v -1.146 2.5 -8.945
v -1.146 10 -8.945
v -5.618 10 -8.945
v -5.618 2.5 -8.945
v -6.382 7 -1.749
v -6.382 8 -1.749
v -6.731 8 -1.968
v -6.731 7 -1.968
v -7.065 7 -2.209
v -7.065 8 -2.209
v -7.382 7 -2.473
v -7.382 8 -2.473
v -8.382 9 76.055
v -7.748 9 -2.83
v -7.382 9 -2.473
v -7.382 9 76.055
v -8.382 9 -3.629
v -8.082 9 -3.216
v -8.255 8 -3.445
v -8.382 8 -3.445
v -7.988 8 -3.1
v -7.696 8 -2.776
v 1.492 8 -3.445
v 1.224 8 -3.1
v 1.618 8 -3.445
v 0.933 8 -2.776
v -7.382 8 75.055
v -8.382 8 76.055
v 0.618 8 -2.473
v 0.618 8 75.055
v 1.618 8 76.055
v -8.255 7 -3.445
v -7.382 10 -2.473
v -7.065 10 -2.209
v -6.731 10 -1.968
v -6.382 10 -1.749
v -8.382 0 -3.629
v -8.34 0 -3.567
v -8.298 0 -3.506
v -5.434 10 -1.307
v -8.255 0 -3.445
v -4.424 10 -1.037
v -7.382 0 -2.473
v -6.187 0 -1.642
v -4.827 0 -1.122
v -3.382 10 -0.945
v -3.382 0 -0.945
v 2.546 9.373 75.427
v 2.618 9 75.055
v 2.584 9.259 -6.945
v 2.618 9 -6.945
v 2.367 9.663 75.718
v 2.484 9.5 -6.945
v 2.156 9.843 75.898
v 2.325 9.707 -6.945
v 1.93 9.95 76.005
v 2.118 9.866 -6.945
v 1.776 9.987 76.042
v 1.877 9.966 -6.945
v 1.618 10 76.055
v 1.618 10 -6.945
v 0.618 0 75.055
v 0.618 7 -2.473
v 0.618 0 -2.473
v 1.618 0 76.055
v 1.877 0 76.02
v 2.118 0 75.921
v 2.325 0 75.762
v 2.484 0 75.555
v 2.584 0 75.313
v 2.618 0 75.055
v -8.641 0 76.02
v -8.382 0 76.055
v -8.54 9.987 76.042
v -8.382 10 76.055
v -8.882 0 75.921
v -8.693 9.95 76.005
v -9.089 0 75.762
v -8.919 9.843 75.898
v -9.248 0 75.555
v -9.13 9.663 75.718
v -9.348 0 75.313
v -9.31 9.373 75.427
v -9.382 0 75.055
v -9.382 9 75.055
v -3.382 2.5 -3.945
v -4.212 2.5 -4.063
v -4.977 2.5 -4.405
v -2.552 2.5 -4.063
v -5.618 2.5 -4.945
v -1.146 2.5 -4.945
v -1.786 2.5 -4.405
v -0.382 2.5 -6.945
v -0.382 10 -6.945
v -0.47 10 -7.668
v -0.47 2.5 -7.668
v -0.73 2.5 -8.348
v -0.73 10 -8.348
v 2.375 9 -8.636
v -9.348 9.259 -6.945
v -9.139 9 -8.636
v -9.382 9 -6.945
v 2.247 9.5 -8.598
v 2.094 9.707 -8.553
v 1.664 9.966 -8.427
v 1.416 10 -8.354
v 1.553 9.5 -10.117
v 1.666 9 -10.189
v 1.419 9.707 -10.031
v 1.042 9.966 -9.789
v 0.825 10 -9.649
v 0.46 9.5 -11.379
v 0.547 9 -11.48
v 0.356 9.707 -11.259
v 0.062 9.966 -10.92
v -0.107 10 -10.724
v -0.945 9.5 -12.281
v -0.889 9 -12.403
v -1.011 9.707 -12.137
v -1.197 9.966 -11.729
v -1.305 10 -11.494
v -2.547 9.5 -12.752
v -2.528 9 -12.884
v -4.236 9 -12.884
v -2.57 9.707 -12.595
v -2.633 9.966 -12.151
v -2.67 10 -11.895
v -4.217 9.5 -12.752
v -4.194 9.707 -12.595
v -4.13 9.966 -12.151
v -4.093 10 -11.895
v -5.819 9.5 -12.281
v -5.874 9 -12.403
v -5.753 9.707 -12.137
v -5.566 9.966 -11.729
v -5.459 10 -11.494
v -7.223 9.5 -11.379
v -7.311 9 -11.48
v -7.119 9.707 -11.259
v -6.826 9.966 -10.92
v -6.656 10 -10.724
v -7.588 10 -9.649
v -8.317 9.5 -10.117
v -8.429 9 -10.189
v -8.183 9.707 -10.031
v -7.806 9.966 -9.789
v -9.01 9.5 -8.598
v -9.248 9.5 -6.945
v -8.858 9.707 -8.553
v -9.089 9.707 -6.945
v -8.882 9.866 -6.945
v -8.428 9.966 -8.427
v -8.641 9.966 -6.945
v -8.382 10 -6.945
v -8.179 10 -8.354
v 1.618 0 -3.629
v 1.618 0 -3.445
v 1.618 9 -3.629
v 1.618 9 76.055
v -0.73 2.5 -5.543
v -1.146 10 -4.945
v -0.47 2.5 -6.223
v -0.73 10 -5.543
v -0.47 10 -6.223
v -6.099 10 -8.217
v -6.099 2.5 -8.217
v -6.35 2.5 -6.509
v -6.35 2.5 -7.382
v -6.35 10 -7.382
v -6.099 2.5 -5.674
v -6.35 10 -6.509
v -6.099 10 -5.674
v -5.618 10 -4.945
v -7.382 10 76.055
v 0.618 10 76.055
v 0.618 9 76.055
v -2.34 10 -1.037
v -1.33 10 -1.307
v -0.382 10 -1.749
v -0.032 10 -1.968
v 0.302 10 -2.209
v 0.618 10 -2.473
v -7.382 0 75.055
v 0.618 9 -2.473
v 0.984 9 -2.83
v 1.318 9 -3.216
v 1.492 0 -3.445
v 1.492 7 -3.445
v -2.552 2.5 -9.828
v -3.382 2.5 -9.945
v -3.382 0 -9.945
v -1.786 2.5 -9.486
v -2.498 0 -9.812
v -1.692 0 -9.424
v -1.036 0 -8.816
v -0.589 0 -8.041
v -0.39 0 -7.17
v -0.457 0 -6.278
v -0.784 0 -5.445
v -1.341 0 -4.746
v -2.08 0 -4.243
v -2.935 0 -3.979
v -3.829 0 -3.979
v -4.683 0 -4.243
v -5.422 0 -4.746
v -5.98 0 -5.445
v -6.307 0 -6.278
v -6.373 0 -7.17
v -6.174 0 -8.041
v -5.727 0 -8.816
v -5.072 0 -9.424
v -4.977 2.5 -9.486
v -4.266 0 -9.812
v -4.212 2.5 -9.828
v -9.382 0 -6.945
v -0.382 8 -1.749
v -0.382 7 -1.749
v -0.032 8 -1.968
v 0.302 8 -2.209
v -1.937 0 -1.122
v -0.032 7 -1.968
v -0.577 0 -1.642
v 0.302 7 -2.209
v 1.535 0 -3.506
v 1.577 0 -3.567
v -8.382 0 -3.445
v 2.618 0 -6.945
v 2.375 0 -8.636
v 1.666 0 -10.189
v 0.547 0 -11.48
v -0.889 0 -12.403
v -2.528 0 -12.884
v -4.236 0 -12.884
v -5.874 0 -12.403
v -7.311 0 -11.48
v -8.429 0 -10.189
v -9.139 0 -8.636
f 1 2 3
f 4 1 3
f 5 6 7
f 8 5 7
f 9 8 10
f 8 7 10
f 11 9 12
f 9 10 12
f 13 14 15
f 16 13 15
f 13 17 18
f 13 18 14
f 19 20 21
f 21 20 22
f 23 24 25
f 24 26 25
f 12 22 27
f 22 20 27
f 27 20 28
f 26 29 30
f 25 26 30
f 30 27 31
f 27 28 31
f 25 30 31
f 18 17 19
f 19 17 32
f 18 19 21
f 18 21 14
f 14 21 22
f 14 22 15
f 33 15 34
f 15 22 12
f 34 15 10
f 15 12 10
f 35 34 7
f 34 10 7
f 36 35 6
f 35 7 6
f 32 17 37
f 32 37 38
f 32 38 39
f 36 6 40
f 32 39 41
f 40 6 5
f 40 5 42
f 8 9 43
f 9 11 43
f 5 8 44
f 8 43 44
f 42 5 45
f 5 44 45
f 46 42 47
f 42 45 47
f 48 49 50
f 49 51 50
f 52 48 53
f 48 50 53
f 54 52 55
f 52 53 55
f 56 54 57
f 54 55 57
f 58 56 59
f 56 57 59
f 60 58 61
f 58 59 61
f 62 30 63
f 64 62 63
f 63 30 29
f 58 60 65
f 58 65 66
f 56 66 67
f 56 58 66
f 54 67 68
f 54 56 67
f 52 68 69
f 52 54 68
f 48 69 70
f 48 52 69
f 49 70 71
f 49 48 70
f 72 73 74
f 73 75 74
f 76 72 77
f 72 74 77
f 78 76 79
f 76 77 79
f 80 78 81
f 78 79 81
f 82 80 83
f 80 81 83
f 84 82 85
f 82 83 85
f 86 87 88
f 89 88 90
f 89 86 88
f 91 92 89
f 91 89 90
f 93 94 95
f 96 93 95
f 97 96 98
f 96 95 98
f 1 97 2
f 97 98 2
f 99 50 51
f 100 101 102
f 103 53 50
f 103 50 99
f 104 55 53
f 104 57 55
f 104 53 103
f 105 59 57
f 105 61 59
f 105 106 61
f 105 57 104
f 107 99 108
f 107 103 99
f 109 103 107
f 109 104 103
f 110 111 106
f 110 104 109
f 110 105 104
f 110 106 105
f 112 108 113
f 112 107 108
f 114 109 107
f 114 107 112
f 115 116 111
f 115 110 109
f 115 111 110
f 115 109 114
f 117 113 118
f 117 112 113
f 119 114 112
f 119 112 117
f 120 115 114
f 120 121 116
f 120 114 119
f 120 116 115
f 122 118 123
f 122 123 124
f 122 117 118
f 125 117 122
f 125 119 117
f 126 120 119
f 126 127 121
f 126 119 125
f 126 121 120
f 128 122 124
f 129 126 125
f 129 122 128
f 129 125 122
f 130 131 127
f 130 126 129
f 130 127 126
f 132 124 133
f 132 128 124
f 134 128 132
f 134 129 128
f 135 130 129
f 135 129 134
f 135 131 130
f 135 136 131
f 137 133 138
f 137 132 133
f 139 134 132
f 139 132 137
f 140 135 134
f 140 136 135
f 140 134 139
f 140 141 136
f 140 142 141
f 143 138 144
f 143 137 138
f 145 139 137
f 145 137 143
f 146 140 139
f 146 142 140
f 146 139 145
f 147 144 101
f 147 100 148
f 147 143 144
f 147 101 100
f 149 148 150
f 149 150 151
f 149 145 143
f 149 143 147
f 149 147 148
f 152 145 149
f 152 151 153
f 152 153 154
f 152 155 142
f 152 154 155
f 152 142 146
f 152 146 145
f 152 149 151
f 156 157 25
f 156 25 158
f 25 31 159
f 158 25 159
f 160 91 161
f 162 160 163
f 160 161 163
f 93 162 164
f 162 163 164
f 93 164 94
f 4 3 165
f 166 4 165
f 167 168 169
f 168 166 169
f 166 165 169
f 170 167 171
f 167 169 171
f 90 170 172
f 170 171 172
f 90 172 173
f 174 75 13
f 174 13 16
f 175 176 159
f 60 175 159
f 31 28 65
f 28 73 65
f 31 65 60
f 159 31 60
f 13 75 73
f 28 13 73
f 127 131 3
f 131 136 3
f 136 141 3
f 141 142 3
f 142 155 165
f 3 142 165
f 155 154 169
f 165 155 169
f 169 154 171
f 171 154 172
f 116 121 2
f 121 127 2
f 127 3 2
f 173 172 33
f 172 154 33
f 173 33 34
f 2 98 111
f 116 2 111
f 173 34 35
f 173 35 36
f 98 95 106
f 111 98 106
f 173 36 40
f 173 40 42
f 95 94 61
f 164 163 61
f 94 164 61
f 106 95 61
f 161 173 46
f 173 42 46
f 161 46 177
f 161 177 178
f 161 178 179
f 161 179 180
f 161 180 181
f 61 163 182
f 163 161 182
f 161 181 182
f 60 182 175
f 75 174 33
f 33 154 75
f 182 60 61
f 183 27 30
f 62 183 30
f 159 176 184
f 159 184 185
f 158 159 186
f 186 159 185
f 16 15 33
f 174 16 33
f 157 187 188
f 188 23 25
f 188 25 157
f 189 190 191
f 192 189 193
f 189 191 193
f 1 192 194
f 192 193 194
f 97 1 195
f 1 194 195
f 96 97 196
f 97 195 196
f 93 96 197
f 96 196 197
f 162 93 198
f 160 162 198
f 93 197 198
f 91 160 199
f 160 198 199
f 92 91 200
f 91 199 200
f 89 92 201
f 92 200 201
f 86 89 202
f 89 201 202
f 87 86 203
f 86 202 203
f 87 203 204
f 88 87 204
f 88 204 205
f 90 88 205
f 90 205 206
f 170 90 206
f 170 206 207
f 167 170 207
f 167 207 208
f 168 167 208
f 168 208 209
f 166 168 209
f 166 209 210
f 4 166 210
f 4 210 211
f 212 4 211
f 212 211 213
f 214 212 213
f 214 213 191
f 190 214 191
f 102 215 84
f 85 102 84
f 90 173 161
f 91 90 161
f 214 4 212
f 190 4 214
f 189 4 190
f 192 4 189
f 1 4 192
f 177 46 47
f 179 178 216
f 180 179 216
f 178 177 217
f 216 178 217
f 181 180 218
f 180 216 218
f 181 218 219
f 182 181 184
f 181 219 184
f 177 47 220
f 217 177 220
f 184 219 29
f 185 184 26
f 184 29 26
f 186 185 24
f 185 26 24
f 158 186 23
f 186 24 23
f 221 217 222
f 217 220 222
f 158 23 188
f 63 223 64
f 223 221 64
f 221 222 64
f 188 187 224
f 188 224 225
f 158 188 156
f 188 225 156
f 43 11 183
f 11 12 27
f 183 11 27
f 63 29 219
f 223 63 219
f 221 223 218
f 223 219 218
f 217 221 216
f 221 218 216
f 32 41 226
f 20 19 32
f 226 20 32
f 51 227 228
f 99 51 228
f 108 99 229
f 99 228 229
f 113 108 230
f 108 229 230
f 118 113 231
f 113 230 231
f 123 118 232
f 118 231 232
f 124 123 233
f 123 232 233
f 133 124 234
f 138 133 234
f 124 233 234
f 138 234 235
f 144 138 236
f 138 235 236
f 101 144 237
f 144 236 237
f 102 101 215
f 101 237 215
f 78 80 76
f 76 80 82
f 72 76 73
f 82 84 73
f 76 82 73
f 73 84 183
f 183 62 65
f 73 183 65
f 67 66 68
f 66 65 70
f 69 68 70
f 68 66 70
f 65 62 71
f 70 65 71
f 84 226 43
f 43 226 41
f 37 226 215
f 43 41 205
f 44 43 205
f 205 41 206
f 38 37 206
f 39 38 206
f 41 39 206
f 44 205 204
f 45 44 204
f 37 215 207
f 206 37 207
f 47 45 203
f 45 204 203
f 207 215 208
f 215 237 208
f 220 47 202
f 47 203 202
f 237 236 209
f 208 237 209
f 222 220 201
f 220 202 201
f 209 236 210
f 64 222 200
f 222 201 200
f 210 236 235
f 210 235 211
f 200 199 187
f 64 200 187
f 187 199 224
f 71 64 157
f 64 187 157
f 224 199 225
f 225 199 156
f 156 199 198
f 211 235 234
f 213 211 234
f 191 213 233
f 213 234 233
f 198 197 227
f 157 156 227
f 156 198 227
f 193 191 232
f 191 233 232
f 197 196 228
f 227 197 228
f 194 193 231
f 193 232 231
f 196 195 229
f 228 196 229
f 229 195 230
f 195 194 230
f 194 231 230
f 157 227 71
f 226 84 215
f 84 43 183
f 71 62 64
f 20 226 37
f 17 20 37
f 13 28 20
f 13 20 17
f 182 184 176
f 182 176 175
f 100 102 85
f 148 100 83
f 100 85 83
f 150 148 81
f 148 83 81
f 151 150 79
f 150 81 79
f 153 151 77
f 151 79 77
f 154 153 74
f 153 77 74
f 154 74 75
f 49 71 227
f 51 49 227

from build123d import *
from build123d.topology import SkipClean

# Parameters (mm, degrees)
SKETCH1_W           = 1
SKETCH1_H           = 1
SKETCH1_W_2         = 5
BOSS_EXTRUDE2_DEPTH = 10
CUT_EXTRUDE1_DEPTH  = 7.5
CUT_EXTRUDE2_START  = -2.5
CUT_EXTRUDE2_DEPTH  = 2.5
CUT_EXTRUDE3_REACH  = 92.05
SKETCH5_W           = 5
SKETCH5_H           = 1
SKETCH6_W           = 2
SKETCH6_H           = 1
BOSS_EXTRUDE3_DEPTH = 79.5
FILLET1_R           = 1
SKETCH7_W           = 1
SKETCH7_H           = 1
CUT_EXTRUDE7_DEPTH  = 79
BOSS_EXTRUDE4_DEPTH = 3
SKETCH9_W           = 1
SKETCH9_H           = 1
CUT_EXTRUDE8_DEPTH  = 6
SKETCH11_W          = 1
SKETCH11_H          = 1
BOSS_EXTRUDE5_DEPTH = 80
SKETCH12_W          = 1
SKETCH12_H          = 1
BOSS_EXTRUDE6_DEPTH = 80
BOSS_EXTRUDE7_DEPTH = 8
CUT_EXTRUDE9_DEPTH  = 1
SKETCH15_R          = 3
CUT_EXTRUDE10_DEPTH = 2.5
CUT_EXTRUDE13_REACH = 79.281


with BuildPart() as part:
    # Sketch1 → Boss-Extrude2 (new body)
    with BuildSketch(Plane(origin=(0, 0, 0), x_dir=(1, 0, 0), z_dir=(0, 1, 0))):
        with BuildLine():
            Line((-5.881818182, 6.945454545), (-3.381818182, 6.945454545))
            Line((-3.381818182, 6.945454545), (-0.881818182, 6.945454545))
            ThreePointArc((-0.881818182, 6.945454545), (-3.381818182, 9.445454545), (-5.881818182, 6.945454545))
        make_face()
        with BuildLine():
            Line((-0.881818182, 6.945454545), (-3.381818182, 6.945454545))
            Line((-3.381818182, 6.945454545), (-3.381818182, 4.445454545))
            ThreePointArc((-3.381818182, 4.445454545), (-1.614051229, 5.177687592), (-0.881818182, 6.945454545))
        make_face()
        with BuildLine():
            Line((-3.381818182, 4.445454545), (-3.381818182, 6.945454545))
            Line((-3.381818182, 6.945454545), (-5.881818182, 6.945454545))
            ThreePointArc((-5.881818182, 6.945454545), (-5.149585135, 5.177687592), (-3.381818182, 4.445454545))
        make_face()
        with BuildLine():
            ThreePointArc((-0.881818182, 6.945454545), (-1.614051229, 5.177687592), (-3.381818182, 4.445454545))
            Line((-3.381818182, 4.445454545), (-3.381818182, 0.945454545))
            ThreePointArc((-3.381818182, 0.945454545), (-0.544543851, 1.658690472), (1.618181818, 3.628829755))
            ThreePointArc((1.618181818, 3.628829755), (2.362744465, 5.213403738), (2.618181818, 6.945454545))
            Line((2.618181818, 6.945454545), (-0.881818182, 6.945454545))
        make_face()
        with BuildLine():
            Line((-3.381818182, 0.945454545), (-3.381818182, 4.445454545))
            ThreePointArc((-3.381818182, 4.445454545), (-5.149585135, 5.177687592), (-5.881818182, 6.945454545))
            Line((-5.881818182, 6.945454545), (-9.381818182, 6.945454545))
            ThreePointArc((-9.381818182, 6.945454545), (-9.126380828, 5.213403738), (-8.381818182, 3.628829755))
            ThreePointArc((-8.381818182, 3.628829755), (-6.219092513, 1.658690472), (-3.381818182, 0.945454545))
        make_face()
        with BuildLine():
            ThreePointArc((-5.881818182, 6.945454545), (-3.381818182, 9.445454545), (-0.881818182, 6.945454545))
            Line((-0.881818182, 6.945454545), (2.618181818, 6.945454545))
            ThreePointArc((2.618181818, 6.945454545), (-3.381818182, 12.945454545), (-9.381818182, 6.945454545))
            Line((-9.381818182, 6.945454545), (-5.881818182, 6.945454545))
        make_face()
        with BuildLine():
            Line((2.618181818, -75.054545455), (2.618181818, 6.945454545))
            ThreePointArc((2.618181818, 6.945454545), (2.362744465, 5.213403738), (1.618181818, 3.628829755))
            Line((1.618181818, 3.628829755), (1.618181818, -75.054545455))
            Line((1.618181818, -75.054545455), (2.618181818, -75.054545455))
        make_face()
        with BuildLine():
            ThreePointArc((-8.381818182, 3.628829755), (-9.126380828, 5.213403738), (-9.381818182, 6.945454545))
            Line((-9.381818182, 6.945454545), (-9.381818182, -75.054545455))
            Line((-9.381818182, -75.054545455), (-8.381818182, -75.054545455))
            Line((-8.381818182, -75.054545455), (-8.381818182, 3.628829755))
        make_face()
        with Locations((-8.881818182, -75.554545455)):
            Rectangle(SKETCH1_W, SKETCH1_H)
        with Locations((-5.881818182, -75.554545455)):
            Rectangle(SKETCH1_W_2, SKETCH1_H)
        with Locations((-0.881818182, -75.554545455)):
            Rectangle(SKETCH1_W_2, SKETCH1_H)
        with Locations((2.118181818, -75.554545455)):
            Rectangle(SKETCH1_W, SKETCH1_H)
    extrude(amount=BOSS_EXTRUDE2_DEPTH)

    # Sketch3 → Cut-Extrude1 (cut)
    with BuildSketch(Plane(origin=(0, 10, 0), x_dir=(1, 0, 0), z_dir=(0, 1, 0))):
        with BuildLine():
            Line((-1.381818182, 8.445454545), (-5.381818182, 8.445454545))
            ThreePointArc((-5.381818182, 8.445454545), (-5.753526425, 7.736023967), (-5.881818182, 6.945454559))
            ThreePointArc((-5.881818182, 6.945454559), (-5.753526429, 6.154885137), (-5.381818182, 5.445454545))
            Line((-5.381818182, 5.445454545), (-1.381818182, 5.445454545))
            ThreePointArc((-1.381818182, 5.445454545), (-1.010109937, 6.15488513), (-0.881818182, 6.945454545))
            ThreePointArc((-0.881818182, 6.945454545), (-1.010109937, 7.73602396), (-1.381818182, 8.445454545))
        make_face()
    extrude(amount=-CUT_EXTRUDE1_DEPTH, mode=Mode.SUBTRACT)

    # Sketch4 → Cut-Extrude2 (cut)
    with SkipClean():  # the faces are left unmerged after this step: merging them gives an invalid solid
        with BuildSketch(Plane.XZ.offset(CUT_EXTRUDE2_START)):
            with BuildLine():
                ThreePointArc((-0.881818182, -6.945454545), (-1.614051229, -5.177687592), (-3.381818182, -4.445454545))
                Line((-3.381818182, -4.445454545), (-3.381818182, -9.445454545))
                ThreePointArc((-3.381818182, -9.445454545), (-1.614051229, -8.713221498), (-0.881818182, -6.945454545))
            make_face()
            with BuildLine():
                Line((-3.381818182, -9.445454545), (-3.381818182, -4.445454545))
                ThreePointArc((-3.381818182, -4.445454545), (-5.881818182, -6.945454545), (-3.381818182, -9.445454545))
            make_face()
        extrude(amount=CUT_EXTRUDE2_DEPTH, mode=Mode.SUBTRACT)

    # Sketch5 → Cut-Extrude3 (cut, up to next)
    with BuildSketch(Plane.XY.offset(76.054545455), mode=Mode.PRIVATE) as cut_extrude3_sk1:
        with Locations((-5.881818182, 8.5)):
            Rectangle(SKETCH5_W, SKETCH5_H)
    cut_extrude3_tool1 = extrude(cut_extrude3_sk1.sketch, amount=-CUT_EXTRUDE3_REACH, mode=Mode.PRIVATE) & part.part
    # Sketch5 → Cut-Extrude3 (cut, up to next)
    with BuildSketch(Plane.XY.offset(76.054545455), mode=Mode.PRIVATE) as cut_extrude3_sk2:
        with Locations((-0.881818182, 8.5)):
            Rectangle(SKETCH5_W, SKETCH5_H)
    cut_extrude3_tool2 = extrude(cut_extrude3_sk2.sketch, amount=-CUT_EXTRUDE3_REACH, mode=Mode.PRIVATE) & part.part
    add(cut_extrude3_tool1.solids().sort_by_distance((-5.881818, 8.5, 76.054545))[0], mode=Mode.SUBTRACT)
    add(cut_extrude3_tool2.solids().sort_by_distance((-0.881818, 8.5, 76.054545))[0], mode=Mode.SUBTRACT)

    # Sketch6 → Boss-Extrude3 (add)
    with SkipClean():  # the faces are left unmerged after this step: merging them gives an invalid solid
        with BuildSketch(Plane.XY.offset(76.054545455)):
            with Locations((-7.381818182, 9.5)):
                Rectangle(SKETCH6_W, SKETCH6_H)
            with Locations((-7.381818182, 7.5)):
                Rectangle(SKETCH6_W, SKETCH6_H)
            with Locations((0.618181818, 7.5)):
                Rectangle(SKETCH6_W, SKETCH6_H)
            with Locations((0.618181818, 9.5)):
                Rectangle(SKETCH6_W, SKETCH6_H)
        extrude(amount=-BOSS_EXTRUDE3_DEPTH)

    # Fillet1
    fillet1_edges = [part.edges().sort_by_distance(p)[0] for p in [
        (2.618181818, 10, 34.554545455),
        (-9.381818182, 5, 76.054545455),
        (2.618181818, 5, 76.054545455),
        (-3.381818182, 10, -12.945454545),
        (-9.381818182, 10, 34.554545455),
    ]]
    fillet(fillet1_edges, radius=FILLET1_R - 0.0001)  # a hair under: the kernel refuses the full size

    # Sketch7 → Cut-Extrude7 (cut)
    with BuildSketch(Plane.XY.offset(76.054545455)):
        with Locations((-6.881818182, 9.5)):
            Rectangle(SKETCH7_W, SKETCH7_H)
        with Locations((0.118181818, 9.5)):
            Rectangle(SKETCH7_W, SKETCH7_H)
    extrude(amount=-CUT_EXTRUDE7_DEPTH, mode=Mode.SUBTRACT)


with BuildPart() as cut_extrude7_piece_1:
    # of the separate pieces the step leaves, piece 1, a body of its own (cut_extrude7_pieces)
    add(part.part.solids().sort_by_distance((1.618281818, 0, 76.054545455))[0])

    # Sketch8 → Boss-Extrude4 (add)
    # profile 1 of 5: a face of its own
    with BuildSketch(Plane(origin=(0, 10, 0), x_dir=(1, 0, 0), z_dir=(0, 1, 0))):
        with BuildLine():
            Line((-8.381818182, 6.945454545), (-8.381818182, 3.628829755))
            ThreePointArc((-8.381818182, 3.628829755), (-8.319368136, 3.536554363), (-8.255215354, 3.445454545))
            ThreePointArc((-8.255215354, 3.445454545), (-7.845063237, 2.935536395), (-7.381818182, 2.47331859))
            Line((-7.381818182, 2.47331859), (-7.381818182, 2.945454545))
            Line((-7.381818182, 2.945454545), (-6.381818182, 2.945454545))
            Line((-6.381818182, 2.945454545), (-6.381818182, 1.749302123))
            ThreePointArc((-6.381818182, 1.749302123), (-3.381818182, 0.945454545), (-0.381818182, 1.749302123))
            Line((-0.381818182, 1.749302123), (-0.381818182, 2.945454545))
            Line((-0.381818182, 2.945454545), (0.618181818, 2.945454545))
            Line((0.618181818, 2.945454545), (0.618181818, 2.47331859))
            ThreePointArc((0.618181818, 2.47331859), (1.081426873, 2.935536395), (1.491578991, 3.445454545))
            ThreePointArc((1.491578991, 3.445454545), (1.555731772, 3.536554363), (1.618181818, 3.628829755))
            Line((1.618181818, 3.628829755), (1.618181818, 6.945454545))
            ThreePointArc((1.618181818, 6.945454545), (-3.381818182, 11.945454545), (-8.381818182, 6.945454545))
        make_face()
        with BuildLine():
            ThreePointArc((-5.381818182, 5.445454545), (-5.881818182, 6.945454545), (-5.381818182, 8.445454545))
            ThreePointArc((-5.381818182, 8.445454545), (-3.381818182, 9.445454545), (-1.381818182, 8.445454545))
            ThreePointArc((-1.381818182, 8.445454545), (-1.010109937, 7.73602396), (-0.881818182, 6.945454545))
            ThreePointArc((-0.881818182, 6.945454545), (-1.010109937, 6.15488513), (-1.381818182, 5.445454545))
            ThreePointArc((-1.381818182, 5.445454545), (-3.381818182, 4.445454545), (-5.381818182, 5.445454545))
        make_face(mode=Mode.SUBTRACT)
    # profile 2 of 5: a face of its own
    with BuildSketch(Plane(origin=(0, 10, 0), x_dir=(1, 0, 0), z_dir=(0, 1, 0))):
        with BuildLine():
            ThreePointArc((-0.381818182, 1.749302123), (0.136853437, 2.085521414), (0.618181818, 2.47331859))
            Line((0.618181818, 2.47331859), (0.618181818, 2.945454545))
            Line((0.618181818, 2.945454545), (-0.381818182, 2.945454545))
            Line((-0.381818182, 2.945454545), (-0.381818182, 1.749302123))
        make_face()
    # profile 3 of 5: a face of its own
    with BuildSketch(Plane(origin=(0, 10, 0), x_dir=(1, 0, 0), z_dir=(0, 1, 0))):
        with BuildLine():
            Line((-7.381818182, 2.945454545), (-7.381818182, 2.47331859))
            ThreePointArc((-7.381818182, 2.47331859), (-6.900489801, 2.085521414), (-6.381818182, 1.749302123))
            Line((-6.381818182, 1.749302123), (-6.381818182, 2.945454545))
            Line((-6.381818182, 2.945454545), (-7.381818182, 2.945454545))
        make_face()
    # profile 4 of 5: a face of its own
    with BuildSketch(Plane(origin=(0, 10, 0), x_dir=(1, 0, 0), z_dir=(0, 1, 0))):
        with BuildLine():
            ThreePointArc((-1.381818182, 8.445454545), (-3.381818182, 9.445454545), (-5.381818182, 8.445454545))
            Line((-5.381818182, 8.445454545), (-1.381818182, 8.445454545))
        make_face()
    # profile 5 of 5: a face of its own
    with BuildSketch(Plane(origin=(0, 10, 0), x_dir=(1, 0, 0), z_dir=(0, 1, 0))):
        with BuildLine():
            Line((-1.381818182, 5.445454545), (-5.381818182, 5.445454545))
            ThreePointArc((-5.381818182, 5.445454545), (-3.381818182, 4.445454545), (-1.381818182, 5.445454545))
        make_face()
    extrude(amount=-BOSS_EXTRUDE4_DEPTH)

    # Sketch11 → Boss-Extrude5 (add)
    with BuildSketch(Plane.XY.offset(76.054545455)):
        with Locations((-7.881818182, 9.5)):
            Rectangle(SKETCH11_W, SKETCH11_H)
    extrude(amount=-BOSS_EXTRUDE5_DEPTH)

    # Sketch12 → Boss-Extrude6 (add)
    with BuildSketch(Plane.XY.offset(76.054545455)):
        with Locations((1.118181818, 9.5)):
            Rectangle(SKETCH12_W, SKETCH12_H)
    extrude(amount=-BOSS_EXTRUDE6_DEPTH)

    # Sketch13 → Boss-Extrude7 (add)
    with BuildSketch(Plane(origin=(0, 8, 0), x_dir=(1, 0, 0), z_dir=(0, 1, 0))):
        with BuildLine():
            Line((-8.381818182, 3.445454545), (-8.381818182, -76.054545455))
            Line((-8.381818182, -76.054545455), (-7.381818182, -76.054545455))
            Line((-7.381818182, -76.054545455), (-7.381818182, 2.47331859))
            ThreePointArc((-7.381818182, 2.47331859), (-7.845063237, 2.935536395), (-8.255215354, 3.445454545))
            Line((-8.255215354, 3.445454545), (-8.381818182, 3.445454545))
        make_face()
        with BuildLine():
            Line((0.618181818, 2.47331859), (0.618181818, -76.054545455))
            Line((0.618181818, -76.054545455), (1.618181818, -76.054545455))
            Line((1.618181818, -76.054545455), (1.618181818, 3.445454545))
            Line((1.618181818, 3.445454545), (1.491578991, 3.445454545))
            ThreePointArc((1.491578991, 3.445454545), (1.081426873, 2.935536395), (0.618181818, 2.47331859))
        make_face()
    extrude(amount=-BOSS_EXTRUDE7_DEPTH)

    # Sketch14 → Cut-Extrude9 (cut)
    with BuildSketch(Plane(origin=(0, 8, 0), x_dir=(1, 0, 0), z_dir=(0, 1, 0))):
        with BuildLine():
            ThreePointArc((0.618181818, 2.47331859), (0.136853437, 2.085521414), (-0.381818182, 1.749302123))
            Line((-0.381818182, 1.749302123), (-0.381818182, -75.054545455))
            Line((-0.381818182, -75.054545455), (0.618181818, -75.054545455))
            Line((0.618181818, -75.054545455), (0.618181818, 2.47331859))
        make_face()
        with BuildLine():
            ThreePointArc((-6.381818182, 1.749302123), (-6.900489801, 2.085521414), (-7.381818182, 2.47331859))
            Line((-7.381818182, 2.47331859), (-7.381818182, -75.054545455))
            Line((-7.381818182, -75.054545455), (-6.381818182, -75.054545455))
            Line((-6.381818182, -75.054545455), (-6.381818182, 1.749302123))
        make_face()
    extrude(amount=-CUT_EXTRUDE9_DEPTH, mode=Mode.SUBTRACT)

    # Sketch15 → Cut-Extrude10 (cut)
    with BuildSketch(Plane.XZ):
        with Locations(Location((-3.381818182, -6.945454545, 0), (0, 0, 270))):
            Circle(SKETCH15_R)
    extrude(amount=-CUT_EXTRUDE10_DEPTH, mode=Mode.SUBTRACT)

    # Sketch17 → Cut-Extrude13 (cut, up to next)
    with BuildSketch(Plane(origin=(0, 10, 0), x_dir=(1, 0, 0), z_dir=(0, 1, 0)), mode=Mode.PRIVATE) as cut_extrude13_sk1:
        with BuildLine():
            Line((-1.145750204, 8.945454545), (-5.617886159, 8.945454545))
            ThreePointArc((-5.617886159, 8.945454545), (-6.381818182, 6.945454545), (-5.617886159, 4.945454545))
            Line((-5.617886159, 4.945454545), (-1.145750204, 4.945454545))
            ThreePointArc((-1.145750204, 4.945454545), (-0.579301105, 5.874988276), (-0.381818182, 6.945454545))
            ThreePointArc((-0.381818182, 6.945454545), (-0.579301105, 8.015920815), (-1.145750204, 8.945454545))
        make_face()
        with BuildLine():
            ThreePointArc((-1.381818182, 8.445454545), (-0.881818182, 6.945454545), (-1.381818182, 5.445454545))
            Line((-1.381818182, 5.445454545), (-5.381818182, 5.445454545))
            ThreePointArc((-5.381818182, 5.445454545), (-5.881818182, 6.945454545), (-5.381818182, 8.445454545))
            Line((-5.381818182, 8.445454545), (-1.381818182, 8.445454545))
        make_face(mode=Mode.SUBTRACT)
    cut_extrude13_tool1 = extrude(cut_extrude13_sk1.sketch, amount=-CUT_EXTRUDE13_REACH, mode=Mode.PRIVATE) & cut_extrude7_piece_1.part
    add(cut_extrude13_tool1.solids().sort_by_distance((-3.381818, 10, -8.873344))[0], mode=Mode.SUBTRACT)


with BuildPart() as cut_extrude7_piece_2:
    # of the separate pieces the step leaves, piece 2, a body of its own (cut_extrude7_pieces)
    add(part.part.solids().sort_by_distance((-6.381818182, 10, 76.054545455))[0])

    # Sketch9 → Cut-Extrude8 (cut)
    with BuildSketch(Plane.ZY.offset(6.381818182)):
        with Locations((75.554545455, 9.5)):
            Rectangle(SKETCH9_W, SKETCH9_H)
    extrude(amount=-CUT_EXTRUDE8_DEPTH, mode=Mode.SUBTRACT)


solid = cut_extrude7_piece_1.part
